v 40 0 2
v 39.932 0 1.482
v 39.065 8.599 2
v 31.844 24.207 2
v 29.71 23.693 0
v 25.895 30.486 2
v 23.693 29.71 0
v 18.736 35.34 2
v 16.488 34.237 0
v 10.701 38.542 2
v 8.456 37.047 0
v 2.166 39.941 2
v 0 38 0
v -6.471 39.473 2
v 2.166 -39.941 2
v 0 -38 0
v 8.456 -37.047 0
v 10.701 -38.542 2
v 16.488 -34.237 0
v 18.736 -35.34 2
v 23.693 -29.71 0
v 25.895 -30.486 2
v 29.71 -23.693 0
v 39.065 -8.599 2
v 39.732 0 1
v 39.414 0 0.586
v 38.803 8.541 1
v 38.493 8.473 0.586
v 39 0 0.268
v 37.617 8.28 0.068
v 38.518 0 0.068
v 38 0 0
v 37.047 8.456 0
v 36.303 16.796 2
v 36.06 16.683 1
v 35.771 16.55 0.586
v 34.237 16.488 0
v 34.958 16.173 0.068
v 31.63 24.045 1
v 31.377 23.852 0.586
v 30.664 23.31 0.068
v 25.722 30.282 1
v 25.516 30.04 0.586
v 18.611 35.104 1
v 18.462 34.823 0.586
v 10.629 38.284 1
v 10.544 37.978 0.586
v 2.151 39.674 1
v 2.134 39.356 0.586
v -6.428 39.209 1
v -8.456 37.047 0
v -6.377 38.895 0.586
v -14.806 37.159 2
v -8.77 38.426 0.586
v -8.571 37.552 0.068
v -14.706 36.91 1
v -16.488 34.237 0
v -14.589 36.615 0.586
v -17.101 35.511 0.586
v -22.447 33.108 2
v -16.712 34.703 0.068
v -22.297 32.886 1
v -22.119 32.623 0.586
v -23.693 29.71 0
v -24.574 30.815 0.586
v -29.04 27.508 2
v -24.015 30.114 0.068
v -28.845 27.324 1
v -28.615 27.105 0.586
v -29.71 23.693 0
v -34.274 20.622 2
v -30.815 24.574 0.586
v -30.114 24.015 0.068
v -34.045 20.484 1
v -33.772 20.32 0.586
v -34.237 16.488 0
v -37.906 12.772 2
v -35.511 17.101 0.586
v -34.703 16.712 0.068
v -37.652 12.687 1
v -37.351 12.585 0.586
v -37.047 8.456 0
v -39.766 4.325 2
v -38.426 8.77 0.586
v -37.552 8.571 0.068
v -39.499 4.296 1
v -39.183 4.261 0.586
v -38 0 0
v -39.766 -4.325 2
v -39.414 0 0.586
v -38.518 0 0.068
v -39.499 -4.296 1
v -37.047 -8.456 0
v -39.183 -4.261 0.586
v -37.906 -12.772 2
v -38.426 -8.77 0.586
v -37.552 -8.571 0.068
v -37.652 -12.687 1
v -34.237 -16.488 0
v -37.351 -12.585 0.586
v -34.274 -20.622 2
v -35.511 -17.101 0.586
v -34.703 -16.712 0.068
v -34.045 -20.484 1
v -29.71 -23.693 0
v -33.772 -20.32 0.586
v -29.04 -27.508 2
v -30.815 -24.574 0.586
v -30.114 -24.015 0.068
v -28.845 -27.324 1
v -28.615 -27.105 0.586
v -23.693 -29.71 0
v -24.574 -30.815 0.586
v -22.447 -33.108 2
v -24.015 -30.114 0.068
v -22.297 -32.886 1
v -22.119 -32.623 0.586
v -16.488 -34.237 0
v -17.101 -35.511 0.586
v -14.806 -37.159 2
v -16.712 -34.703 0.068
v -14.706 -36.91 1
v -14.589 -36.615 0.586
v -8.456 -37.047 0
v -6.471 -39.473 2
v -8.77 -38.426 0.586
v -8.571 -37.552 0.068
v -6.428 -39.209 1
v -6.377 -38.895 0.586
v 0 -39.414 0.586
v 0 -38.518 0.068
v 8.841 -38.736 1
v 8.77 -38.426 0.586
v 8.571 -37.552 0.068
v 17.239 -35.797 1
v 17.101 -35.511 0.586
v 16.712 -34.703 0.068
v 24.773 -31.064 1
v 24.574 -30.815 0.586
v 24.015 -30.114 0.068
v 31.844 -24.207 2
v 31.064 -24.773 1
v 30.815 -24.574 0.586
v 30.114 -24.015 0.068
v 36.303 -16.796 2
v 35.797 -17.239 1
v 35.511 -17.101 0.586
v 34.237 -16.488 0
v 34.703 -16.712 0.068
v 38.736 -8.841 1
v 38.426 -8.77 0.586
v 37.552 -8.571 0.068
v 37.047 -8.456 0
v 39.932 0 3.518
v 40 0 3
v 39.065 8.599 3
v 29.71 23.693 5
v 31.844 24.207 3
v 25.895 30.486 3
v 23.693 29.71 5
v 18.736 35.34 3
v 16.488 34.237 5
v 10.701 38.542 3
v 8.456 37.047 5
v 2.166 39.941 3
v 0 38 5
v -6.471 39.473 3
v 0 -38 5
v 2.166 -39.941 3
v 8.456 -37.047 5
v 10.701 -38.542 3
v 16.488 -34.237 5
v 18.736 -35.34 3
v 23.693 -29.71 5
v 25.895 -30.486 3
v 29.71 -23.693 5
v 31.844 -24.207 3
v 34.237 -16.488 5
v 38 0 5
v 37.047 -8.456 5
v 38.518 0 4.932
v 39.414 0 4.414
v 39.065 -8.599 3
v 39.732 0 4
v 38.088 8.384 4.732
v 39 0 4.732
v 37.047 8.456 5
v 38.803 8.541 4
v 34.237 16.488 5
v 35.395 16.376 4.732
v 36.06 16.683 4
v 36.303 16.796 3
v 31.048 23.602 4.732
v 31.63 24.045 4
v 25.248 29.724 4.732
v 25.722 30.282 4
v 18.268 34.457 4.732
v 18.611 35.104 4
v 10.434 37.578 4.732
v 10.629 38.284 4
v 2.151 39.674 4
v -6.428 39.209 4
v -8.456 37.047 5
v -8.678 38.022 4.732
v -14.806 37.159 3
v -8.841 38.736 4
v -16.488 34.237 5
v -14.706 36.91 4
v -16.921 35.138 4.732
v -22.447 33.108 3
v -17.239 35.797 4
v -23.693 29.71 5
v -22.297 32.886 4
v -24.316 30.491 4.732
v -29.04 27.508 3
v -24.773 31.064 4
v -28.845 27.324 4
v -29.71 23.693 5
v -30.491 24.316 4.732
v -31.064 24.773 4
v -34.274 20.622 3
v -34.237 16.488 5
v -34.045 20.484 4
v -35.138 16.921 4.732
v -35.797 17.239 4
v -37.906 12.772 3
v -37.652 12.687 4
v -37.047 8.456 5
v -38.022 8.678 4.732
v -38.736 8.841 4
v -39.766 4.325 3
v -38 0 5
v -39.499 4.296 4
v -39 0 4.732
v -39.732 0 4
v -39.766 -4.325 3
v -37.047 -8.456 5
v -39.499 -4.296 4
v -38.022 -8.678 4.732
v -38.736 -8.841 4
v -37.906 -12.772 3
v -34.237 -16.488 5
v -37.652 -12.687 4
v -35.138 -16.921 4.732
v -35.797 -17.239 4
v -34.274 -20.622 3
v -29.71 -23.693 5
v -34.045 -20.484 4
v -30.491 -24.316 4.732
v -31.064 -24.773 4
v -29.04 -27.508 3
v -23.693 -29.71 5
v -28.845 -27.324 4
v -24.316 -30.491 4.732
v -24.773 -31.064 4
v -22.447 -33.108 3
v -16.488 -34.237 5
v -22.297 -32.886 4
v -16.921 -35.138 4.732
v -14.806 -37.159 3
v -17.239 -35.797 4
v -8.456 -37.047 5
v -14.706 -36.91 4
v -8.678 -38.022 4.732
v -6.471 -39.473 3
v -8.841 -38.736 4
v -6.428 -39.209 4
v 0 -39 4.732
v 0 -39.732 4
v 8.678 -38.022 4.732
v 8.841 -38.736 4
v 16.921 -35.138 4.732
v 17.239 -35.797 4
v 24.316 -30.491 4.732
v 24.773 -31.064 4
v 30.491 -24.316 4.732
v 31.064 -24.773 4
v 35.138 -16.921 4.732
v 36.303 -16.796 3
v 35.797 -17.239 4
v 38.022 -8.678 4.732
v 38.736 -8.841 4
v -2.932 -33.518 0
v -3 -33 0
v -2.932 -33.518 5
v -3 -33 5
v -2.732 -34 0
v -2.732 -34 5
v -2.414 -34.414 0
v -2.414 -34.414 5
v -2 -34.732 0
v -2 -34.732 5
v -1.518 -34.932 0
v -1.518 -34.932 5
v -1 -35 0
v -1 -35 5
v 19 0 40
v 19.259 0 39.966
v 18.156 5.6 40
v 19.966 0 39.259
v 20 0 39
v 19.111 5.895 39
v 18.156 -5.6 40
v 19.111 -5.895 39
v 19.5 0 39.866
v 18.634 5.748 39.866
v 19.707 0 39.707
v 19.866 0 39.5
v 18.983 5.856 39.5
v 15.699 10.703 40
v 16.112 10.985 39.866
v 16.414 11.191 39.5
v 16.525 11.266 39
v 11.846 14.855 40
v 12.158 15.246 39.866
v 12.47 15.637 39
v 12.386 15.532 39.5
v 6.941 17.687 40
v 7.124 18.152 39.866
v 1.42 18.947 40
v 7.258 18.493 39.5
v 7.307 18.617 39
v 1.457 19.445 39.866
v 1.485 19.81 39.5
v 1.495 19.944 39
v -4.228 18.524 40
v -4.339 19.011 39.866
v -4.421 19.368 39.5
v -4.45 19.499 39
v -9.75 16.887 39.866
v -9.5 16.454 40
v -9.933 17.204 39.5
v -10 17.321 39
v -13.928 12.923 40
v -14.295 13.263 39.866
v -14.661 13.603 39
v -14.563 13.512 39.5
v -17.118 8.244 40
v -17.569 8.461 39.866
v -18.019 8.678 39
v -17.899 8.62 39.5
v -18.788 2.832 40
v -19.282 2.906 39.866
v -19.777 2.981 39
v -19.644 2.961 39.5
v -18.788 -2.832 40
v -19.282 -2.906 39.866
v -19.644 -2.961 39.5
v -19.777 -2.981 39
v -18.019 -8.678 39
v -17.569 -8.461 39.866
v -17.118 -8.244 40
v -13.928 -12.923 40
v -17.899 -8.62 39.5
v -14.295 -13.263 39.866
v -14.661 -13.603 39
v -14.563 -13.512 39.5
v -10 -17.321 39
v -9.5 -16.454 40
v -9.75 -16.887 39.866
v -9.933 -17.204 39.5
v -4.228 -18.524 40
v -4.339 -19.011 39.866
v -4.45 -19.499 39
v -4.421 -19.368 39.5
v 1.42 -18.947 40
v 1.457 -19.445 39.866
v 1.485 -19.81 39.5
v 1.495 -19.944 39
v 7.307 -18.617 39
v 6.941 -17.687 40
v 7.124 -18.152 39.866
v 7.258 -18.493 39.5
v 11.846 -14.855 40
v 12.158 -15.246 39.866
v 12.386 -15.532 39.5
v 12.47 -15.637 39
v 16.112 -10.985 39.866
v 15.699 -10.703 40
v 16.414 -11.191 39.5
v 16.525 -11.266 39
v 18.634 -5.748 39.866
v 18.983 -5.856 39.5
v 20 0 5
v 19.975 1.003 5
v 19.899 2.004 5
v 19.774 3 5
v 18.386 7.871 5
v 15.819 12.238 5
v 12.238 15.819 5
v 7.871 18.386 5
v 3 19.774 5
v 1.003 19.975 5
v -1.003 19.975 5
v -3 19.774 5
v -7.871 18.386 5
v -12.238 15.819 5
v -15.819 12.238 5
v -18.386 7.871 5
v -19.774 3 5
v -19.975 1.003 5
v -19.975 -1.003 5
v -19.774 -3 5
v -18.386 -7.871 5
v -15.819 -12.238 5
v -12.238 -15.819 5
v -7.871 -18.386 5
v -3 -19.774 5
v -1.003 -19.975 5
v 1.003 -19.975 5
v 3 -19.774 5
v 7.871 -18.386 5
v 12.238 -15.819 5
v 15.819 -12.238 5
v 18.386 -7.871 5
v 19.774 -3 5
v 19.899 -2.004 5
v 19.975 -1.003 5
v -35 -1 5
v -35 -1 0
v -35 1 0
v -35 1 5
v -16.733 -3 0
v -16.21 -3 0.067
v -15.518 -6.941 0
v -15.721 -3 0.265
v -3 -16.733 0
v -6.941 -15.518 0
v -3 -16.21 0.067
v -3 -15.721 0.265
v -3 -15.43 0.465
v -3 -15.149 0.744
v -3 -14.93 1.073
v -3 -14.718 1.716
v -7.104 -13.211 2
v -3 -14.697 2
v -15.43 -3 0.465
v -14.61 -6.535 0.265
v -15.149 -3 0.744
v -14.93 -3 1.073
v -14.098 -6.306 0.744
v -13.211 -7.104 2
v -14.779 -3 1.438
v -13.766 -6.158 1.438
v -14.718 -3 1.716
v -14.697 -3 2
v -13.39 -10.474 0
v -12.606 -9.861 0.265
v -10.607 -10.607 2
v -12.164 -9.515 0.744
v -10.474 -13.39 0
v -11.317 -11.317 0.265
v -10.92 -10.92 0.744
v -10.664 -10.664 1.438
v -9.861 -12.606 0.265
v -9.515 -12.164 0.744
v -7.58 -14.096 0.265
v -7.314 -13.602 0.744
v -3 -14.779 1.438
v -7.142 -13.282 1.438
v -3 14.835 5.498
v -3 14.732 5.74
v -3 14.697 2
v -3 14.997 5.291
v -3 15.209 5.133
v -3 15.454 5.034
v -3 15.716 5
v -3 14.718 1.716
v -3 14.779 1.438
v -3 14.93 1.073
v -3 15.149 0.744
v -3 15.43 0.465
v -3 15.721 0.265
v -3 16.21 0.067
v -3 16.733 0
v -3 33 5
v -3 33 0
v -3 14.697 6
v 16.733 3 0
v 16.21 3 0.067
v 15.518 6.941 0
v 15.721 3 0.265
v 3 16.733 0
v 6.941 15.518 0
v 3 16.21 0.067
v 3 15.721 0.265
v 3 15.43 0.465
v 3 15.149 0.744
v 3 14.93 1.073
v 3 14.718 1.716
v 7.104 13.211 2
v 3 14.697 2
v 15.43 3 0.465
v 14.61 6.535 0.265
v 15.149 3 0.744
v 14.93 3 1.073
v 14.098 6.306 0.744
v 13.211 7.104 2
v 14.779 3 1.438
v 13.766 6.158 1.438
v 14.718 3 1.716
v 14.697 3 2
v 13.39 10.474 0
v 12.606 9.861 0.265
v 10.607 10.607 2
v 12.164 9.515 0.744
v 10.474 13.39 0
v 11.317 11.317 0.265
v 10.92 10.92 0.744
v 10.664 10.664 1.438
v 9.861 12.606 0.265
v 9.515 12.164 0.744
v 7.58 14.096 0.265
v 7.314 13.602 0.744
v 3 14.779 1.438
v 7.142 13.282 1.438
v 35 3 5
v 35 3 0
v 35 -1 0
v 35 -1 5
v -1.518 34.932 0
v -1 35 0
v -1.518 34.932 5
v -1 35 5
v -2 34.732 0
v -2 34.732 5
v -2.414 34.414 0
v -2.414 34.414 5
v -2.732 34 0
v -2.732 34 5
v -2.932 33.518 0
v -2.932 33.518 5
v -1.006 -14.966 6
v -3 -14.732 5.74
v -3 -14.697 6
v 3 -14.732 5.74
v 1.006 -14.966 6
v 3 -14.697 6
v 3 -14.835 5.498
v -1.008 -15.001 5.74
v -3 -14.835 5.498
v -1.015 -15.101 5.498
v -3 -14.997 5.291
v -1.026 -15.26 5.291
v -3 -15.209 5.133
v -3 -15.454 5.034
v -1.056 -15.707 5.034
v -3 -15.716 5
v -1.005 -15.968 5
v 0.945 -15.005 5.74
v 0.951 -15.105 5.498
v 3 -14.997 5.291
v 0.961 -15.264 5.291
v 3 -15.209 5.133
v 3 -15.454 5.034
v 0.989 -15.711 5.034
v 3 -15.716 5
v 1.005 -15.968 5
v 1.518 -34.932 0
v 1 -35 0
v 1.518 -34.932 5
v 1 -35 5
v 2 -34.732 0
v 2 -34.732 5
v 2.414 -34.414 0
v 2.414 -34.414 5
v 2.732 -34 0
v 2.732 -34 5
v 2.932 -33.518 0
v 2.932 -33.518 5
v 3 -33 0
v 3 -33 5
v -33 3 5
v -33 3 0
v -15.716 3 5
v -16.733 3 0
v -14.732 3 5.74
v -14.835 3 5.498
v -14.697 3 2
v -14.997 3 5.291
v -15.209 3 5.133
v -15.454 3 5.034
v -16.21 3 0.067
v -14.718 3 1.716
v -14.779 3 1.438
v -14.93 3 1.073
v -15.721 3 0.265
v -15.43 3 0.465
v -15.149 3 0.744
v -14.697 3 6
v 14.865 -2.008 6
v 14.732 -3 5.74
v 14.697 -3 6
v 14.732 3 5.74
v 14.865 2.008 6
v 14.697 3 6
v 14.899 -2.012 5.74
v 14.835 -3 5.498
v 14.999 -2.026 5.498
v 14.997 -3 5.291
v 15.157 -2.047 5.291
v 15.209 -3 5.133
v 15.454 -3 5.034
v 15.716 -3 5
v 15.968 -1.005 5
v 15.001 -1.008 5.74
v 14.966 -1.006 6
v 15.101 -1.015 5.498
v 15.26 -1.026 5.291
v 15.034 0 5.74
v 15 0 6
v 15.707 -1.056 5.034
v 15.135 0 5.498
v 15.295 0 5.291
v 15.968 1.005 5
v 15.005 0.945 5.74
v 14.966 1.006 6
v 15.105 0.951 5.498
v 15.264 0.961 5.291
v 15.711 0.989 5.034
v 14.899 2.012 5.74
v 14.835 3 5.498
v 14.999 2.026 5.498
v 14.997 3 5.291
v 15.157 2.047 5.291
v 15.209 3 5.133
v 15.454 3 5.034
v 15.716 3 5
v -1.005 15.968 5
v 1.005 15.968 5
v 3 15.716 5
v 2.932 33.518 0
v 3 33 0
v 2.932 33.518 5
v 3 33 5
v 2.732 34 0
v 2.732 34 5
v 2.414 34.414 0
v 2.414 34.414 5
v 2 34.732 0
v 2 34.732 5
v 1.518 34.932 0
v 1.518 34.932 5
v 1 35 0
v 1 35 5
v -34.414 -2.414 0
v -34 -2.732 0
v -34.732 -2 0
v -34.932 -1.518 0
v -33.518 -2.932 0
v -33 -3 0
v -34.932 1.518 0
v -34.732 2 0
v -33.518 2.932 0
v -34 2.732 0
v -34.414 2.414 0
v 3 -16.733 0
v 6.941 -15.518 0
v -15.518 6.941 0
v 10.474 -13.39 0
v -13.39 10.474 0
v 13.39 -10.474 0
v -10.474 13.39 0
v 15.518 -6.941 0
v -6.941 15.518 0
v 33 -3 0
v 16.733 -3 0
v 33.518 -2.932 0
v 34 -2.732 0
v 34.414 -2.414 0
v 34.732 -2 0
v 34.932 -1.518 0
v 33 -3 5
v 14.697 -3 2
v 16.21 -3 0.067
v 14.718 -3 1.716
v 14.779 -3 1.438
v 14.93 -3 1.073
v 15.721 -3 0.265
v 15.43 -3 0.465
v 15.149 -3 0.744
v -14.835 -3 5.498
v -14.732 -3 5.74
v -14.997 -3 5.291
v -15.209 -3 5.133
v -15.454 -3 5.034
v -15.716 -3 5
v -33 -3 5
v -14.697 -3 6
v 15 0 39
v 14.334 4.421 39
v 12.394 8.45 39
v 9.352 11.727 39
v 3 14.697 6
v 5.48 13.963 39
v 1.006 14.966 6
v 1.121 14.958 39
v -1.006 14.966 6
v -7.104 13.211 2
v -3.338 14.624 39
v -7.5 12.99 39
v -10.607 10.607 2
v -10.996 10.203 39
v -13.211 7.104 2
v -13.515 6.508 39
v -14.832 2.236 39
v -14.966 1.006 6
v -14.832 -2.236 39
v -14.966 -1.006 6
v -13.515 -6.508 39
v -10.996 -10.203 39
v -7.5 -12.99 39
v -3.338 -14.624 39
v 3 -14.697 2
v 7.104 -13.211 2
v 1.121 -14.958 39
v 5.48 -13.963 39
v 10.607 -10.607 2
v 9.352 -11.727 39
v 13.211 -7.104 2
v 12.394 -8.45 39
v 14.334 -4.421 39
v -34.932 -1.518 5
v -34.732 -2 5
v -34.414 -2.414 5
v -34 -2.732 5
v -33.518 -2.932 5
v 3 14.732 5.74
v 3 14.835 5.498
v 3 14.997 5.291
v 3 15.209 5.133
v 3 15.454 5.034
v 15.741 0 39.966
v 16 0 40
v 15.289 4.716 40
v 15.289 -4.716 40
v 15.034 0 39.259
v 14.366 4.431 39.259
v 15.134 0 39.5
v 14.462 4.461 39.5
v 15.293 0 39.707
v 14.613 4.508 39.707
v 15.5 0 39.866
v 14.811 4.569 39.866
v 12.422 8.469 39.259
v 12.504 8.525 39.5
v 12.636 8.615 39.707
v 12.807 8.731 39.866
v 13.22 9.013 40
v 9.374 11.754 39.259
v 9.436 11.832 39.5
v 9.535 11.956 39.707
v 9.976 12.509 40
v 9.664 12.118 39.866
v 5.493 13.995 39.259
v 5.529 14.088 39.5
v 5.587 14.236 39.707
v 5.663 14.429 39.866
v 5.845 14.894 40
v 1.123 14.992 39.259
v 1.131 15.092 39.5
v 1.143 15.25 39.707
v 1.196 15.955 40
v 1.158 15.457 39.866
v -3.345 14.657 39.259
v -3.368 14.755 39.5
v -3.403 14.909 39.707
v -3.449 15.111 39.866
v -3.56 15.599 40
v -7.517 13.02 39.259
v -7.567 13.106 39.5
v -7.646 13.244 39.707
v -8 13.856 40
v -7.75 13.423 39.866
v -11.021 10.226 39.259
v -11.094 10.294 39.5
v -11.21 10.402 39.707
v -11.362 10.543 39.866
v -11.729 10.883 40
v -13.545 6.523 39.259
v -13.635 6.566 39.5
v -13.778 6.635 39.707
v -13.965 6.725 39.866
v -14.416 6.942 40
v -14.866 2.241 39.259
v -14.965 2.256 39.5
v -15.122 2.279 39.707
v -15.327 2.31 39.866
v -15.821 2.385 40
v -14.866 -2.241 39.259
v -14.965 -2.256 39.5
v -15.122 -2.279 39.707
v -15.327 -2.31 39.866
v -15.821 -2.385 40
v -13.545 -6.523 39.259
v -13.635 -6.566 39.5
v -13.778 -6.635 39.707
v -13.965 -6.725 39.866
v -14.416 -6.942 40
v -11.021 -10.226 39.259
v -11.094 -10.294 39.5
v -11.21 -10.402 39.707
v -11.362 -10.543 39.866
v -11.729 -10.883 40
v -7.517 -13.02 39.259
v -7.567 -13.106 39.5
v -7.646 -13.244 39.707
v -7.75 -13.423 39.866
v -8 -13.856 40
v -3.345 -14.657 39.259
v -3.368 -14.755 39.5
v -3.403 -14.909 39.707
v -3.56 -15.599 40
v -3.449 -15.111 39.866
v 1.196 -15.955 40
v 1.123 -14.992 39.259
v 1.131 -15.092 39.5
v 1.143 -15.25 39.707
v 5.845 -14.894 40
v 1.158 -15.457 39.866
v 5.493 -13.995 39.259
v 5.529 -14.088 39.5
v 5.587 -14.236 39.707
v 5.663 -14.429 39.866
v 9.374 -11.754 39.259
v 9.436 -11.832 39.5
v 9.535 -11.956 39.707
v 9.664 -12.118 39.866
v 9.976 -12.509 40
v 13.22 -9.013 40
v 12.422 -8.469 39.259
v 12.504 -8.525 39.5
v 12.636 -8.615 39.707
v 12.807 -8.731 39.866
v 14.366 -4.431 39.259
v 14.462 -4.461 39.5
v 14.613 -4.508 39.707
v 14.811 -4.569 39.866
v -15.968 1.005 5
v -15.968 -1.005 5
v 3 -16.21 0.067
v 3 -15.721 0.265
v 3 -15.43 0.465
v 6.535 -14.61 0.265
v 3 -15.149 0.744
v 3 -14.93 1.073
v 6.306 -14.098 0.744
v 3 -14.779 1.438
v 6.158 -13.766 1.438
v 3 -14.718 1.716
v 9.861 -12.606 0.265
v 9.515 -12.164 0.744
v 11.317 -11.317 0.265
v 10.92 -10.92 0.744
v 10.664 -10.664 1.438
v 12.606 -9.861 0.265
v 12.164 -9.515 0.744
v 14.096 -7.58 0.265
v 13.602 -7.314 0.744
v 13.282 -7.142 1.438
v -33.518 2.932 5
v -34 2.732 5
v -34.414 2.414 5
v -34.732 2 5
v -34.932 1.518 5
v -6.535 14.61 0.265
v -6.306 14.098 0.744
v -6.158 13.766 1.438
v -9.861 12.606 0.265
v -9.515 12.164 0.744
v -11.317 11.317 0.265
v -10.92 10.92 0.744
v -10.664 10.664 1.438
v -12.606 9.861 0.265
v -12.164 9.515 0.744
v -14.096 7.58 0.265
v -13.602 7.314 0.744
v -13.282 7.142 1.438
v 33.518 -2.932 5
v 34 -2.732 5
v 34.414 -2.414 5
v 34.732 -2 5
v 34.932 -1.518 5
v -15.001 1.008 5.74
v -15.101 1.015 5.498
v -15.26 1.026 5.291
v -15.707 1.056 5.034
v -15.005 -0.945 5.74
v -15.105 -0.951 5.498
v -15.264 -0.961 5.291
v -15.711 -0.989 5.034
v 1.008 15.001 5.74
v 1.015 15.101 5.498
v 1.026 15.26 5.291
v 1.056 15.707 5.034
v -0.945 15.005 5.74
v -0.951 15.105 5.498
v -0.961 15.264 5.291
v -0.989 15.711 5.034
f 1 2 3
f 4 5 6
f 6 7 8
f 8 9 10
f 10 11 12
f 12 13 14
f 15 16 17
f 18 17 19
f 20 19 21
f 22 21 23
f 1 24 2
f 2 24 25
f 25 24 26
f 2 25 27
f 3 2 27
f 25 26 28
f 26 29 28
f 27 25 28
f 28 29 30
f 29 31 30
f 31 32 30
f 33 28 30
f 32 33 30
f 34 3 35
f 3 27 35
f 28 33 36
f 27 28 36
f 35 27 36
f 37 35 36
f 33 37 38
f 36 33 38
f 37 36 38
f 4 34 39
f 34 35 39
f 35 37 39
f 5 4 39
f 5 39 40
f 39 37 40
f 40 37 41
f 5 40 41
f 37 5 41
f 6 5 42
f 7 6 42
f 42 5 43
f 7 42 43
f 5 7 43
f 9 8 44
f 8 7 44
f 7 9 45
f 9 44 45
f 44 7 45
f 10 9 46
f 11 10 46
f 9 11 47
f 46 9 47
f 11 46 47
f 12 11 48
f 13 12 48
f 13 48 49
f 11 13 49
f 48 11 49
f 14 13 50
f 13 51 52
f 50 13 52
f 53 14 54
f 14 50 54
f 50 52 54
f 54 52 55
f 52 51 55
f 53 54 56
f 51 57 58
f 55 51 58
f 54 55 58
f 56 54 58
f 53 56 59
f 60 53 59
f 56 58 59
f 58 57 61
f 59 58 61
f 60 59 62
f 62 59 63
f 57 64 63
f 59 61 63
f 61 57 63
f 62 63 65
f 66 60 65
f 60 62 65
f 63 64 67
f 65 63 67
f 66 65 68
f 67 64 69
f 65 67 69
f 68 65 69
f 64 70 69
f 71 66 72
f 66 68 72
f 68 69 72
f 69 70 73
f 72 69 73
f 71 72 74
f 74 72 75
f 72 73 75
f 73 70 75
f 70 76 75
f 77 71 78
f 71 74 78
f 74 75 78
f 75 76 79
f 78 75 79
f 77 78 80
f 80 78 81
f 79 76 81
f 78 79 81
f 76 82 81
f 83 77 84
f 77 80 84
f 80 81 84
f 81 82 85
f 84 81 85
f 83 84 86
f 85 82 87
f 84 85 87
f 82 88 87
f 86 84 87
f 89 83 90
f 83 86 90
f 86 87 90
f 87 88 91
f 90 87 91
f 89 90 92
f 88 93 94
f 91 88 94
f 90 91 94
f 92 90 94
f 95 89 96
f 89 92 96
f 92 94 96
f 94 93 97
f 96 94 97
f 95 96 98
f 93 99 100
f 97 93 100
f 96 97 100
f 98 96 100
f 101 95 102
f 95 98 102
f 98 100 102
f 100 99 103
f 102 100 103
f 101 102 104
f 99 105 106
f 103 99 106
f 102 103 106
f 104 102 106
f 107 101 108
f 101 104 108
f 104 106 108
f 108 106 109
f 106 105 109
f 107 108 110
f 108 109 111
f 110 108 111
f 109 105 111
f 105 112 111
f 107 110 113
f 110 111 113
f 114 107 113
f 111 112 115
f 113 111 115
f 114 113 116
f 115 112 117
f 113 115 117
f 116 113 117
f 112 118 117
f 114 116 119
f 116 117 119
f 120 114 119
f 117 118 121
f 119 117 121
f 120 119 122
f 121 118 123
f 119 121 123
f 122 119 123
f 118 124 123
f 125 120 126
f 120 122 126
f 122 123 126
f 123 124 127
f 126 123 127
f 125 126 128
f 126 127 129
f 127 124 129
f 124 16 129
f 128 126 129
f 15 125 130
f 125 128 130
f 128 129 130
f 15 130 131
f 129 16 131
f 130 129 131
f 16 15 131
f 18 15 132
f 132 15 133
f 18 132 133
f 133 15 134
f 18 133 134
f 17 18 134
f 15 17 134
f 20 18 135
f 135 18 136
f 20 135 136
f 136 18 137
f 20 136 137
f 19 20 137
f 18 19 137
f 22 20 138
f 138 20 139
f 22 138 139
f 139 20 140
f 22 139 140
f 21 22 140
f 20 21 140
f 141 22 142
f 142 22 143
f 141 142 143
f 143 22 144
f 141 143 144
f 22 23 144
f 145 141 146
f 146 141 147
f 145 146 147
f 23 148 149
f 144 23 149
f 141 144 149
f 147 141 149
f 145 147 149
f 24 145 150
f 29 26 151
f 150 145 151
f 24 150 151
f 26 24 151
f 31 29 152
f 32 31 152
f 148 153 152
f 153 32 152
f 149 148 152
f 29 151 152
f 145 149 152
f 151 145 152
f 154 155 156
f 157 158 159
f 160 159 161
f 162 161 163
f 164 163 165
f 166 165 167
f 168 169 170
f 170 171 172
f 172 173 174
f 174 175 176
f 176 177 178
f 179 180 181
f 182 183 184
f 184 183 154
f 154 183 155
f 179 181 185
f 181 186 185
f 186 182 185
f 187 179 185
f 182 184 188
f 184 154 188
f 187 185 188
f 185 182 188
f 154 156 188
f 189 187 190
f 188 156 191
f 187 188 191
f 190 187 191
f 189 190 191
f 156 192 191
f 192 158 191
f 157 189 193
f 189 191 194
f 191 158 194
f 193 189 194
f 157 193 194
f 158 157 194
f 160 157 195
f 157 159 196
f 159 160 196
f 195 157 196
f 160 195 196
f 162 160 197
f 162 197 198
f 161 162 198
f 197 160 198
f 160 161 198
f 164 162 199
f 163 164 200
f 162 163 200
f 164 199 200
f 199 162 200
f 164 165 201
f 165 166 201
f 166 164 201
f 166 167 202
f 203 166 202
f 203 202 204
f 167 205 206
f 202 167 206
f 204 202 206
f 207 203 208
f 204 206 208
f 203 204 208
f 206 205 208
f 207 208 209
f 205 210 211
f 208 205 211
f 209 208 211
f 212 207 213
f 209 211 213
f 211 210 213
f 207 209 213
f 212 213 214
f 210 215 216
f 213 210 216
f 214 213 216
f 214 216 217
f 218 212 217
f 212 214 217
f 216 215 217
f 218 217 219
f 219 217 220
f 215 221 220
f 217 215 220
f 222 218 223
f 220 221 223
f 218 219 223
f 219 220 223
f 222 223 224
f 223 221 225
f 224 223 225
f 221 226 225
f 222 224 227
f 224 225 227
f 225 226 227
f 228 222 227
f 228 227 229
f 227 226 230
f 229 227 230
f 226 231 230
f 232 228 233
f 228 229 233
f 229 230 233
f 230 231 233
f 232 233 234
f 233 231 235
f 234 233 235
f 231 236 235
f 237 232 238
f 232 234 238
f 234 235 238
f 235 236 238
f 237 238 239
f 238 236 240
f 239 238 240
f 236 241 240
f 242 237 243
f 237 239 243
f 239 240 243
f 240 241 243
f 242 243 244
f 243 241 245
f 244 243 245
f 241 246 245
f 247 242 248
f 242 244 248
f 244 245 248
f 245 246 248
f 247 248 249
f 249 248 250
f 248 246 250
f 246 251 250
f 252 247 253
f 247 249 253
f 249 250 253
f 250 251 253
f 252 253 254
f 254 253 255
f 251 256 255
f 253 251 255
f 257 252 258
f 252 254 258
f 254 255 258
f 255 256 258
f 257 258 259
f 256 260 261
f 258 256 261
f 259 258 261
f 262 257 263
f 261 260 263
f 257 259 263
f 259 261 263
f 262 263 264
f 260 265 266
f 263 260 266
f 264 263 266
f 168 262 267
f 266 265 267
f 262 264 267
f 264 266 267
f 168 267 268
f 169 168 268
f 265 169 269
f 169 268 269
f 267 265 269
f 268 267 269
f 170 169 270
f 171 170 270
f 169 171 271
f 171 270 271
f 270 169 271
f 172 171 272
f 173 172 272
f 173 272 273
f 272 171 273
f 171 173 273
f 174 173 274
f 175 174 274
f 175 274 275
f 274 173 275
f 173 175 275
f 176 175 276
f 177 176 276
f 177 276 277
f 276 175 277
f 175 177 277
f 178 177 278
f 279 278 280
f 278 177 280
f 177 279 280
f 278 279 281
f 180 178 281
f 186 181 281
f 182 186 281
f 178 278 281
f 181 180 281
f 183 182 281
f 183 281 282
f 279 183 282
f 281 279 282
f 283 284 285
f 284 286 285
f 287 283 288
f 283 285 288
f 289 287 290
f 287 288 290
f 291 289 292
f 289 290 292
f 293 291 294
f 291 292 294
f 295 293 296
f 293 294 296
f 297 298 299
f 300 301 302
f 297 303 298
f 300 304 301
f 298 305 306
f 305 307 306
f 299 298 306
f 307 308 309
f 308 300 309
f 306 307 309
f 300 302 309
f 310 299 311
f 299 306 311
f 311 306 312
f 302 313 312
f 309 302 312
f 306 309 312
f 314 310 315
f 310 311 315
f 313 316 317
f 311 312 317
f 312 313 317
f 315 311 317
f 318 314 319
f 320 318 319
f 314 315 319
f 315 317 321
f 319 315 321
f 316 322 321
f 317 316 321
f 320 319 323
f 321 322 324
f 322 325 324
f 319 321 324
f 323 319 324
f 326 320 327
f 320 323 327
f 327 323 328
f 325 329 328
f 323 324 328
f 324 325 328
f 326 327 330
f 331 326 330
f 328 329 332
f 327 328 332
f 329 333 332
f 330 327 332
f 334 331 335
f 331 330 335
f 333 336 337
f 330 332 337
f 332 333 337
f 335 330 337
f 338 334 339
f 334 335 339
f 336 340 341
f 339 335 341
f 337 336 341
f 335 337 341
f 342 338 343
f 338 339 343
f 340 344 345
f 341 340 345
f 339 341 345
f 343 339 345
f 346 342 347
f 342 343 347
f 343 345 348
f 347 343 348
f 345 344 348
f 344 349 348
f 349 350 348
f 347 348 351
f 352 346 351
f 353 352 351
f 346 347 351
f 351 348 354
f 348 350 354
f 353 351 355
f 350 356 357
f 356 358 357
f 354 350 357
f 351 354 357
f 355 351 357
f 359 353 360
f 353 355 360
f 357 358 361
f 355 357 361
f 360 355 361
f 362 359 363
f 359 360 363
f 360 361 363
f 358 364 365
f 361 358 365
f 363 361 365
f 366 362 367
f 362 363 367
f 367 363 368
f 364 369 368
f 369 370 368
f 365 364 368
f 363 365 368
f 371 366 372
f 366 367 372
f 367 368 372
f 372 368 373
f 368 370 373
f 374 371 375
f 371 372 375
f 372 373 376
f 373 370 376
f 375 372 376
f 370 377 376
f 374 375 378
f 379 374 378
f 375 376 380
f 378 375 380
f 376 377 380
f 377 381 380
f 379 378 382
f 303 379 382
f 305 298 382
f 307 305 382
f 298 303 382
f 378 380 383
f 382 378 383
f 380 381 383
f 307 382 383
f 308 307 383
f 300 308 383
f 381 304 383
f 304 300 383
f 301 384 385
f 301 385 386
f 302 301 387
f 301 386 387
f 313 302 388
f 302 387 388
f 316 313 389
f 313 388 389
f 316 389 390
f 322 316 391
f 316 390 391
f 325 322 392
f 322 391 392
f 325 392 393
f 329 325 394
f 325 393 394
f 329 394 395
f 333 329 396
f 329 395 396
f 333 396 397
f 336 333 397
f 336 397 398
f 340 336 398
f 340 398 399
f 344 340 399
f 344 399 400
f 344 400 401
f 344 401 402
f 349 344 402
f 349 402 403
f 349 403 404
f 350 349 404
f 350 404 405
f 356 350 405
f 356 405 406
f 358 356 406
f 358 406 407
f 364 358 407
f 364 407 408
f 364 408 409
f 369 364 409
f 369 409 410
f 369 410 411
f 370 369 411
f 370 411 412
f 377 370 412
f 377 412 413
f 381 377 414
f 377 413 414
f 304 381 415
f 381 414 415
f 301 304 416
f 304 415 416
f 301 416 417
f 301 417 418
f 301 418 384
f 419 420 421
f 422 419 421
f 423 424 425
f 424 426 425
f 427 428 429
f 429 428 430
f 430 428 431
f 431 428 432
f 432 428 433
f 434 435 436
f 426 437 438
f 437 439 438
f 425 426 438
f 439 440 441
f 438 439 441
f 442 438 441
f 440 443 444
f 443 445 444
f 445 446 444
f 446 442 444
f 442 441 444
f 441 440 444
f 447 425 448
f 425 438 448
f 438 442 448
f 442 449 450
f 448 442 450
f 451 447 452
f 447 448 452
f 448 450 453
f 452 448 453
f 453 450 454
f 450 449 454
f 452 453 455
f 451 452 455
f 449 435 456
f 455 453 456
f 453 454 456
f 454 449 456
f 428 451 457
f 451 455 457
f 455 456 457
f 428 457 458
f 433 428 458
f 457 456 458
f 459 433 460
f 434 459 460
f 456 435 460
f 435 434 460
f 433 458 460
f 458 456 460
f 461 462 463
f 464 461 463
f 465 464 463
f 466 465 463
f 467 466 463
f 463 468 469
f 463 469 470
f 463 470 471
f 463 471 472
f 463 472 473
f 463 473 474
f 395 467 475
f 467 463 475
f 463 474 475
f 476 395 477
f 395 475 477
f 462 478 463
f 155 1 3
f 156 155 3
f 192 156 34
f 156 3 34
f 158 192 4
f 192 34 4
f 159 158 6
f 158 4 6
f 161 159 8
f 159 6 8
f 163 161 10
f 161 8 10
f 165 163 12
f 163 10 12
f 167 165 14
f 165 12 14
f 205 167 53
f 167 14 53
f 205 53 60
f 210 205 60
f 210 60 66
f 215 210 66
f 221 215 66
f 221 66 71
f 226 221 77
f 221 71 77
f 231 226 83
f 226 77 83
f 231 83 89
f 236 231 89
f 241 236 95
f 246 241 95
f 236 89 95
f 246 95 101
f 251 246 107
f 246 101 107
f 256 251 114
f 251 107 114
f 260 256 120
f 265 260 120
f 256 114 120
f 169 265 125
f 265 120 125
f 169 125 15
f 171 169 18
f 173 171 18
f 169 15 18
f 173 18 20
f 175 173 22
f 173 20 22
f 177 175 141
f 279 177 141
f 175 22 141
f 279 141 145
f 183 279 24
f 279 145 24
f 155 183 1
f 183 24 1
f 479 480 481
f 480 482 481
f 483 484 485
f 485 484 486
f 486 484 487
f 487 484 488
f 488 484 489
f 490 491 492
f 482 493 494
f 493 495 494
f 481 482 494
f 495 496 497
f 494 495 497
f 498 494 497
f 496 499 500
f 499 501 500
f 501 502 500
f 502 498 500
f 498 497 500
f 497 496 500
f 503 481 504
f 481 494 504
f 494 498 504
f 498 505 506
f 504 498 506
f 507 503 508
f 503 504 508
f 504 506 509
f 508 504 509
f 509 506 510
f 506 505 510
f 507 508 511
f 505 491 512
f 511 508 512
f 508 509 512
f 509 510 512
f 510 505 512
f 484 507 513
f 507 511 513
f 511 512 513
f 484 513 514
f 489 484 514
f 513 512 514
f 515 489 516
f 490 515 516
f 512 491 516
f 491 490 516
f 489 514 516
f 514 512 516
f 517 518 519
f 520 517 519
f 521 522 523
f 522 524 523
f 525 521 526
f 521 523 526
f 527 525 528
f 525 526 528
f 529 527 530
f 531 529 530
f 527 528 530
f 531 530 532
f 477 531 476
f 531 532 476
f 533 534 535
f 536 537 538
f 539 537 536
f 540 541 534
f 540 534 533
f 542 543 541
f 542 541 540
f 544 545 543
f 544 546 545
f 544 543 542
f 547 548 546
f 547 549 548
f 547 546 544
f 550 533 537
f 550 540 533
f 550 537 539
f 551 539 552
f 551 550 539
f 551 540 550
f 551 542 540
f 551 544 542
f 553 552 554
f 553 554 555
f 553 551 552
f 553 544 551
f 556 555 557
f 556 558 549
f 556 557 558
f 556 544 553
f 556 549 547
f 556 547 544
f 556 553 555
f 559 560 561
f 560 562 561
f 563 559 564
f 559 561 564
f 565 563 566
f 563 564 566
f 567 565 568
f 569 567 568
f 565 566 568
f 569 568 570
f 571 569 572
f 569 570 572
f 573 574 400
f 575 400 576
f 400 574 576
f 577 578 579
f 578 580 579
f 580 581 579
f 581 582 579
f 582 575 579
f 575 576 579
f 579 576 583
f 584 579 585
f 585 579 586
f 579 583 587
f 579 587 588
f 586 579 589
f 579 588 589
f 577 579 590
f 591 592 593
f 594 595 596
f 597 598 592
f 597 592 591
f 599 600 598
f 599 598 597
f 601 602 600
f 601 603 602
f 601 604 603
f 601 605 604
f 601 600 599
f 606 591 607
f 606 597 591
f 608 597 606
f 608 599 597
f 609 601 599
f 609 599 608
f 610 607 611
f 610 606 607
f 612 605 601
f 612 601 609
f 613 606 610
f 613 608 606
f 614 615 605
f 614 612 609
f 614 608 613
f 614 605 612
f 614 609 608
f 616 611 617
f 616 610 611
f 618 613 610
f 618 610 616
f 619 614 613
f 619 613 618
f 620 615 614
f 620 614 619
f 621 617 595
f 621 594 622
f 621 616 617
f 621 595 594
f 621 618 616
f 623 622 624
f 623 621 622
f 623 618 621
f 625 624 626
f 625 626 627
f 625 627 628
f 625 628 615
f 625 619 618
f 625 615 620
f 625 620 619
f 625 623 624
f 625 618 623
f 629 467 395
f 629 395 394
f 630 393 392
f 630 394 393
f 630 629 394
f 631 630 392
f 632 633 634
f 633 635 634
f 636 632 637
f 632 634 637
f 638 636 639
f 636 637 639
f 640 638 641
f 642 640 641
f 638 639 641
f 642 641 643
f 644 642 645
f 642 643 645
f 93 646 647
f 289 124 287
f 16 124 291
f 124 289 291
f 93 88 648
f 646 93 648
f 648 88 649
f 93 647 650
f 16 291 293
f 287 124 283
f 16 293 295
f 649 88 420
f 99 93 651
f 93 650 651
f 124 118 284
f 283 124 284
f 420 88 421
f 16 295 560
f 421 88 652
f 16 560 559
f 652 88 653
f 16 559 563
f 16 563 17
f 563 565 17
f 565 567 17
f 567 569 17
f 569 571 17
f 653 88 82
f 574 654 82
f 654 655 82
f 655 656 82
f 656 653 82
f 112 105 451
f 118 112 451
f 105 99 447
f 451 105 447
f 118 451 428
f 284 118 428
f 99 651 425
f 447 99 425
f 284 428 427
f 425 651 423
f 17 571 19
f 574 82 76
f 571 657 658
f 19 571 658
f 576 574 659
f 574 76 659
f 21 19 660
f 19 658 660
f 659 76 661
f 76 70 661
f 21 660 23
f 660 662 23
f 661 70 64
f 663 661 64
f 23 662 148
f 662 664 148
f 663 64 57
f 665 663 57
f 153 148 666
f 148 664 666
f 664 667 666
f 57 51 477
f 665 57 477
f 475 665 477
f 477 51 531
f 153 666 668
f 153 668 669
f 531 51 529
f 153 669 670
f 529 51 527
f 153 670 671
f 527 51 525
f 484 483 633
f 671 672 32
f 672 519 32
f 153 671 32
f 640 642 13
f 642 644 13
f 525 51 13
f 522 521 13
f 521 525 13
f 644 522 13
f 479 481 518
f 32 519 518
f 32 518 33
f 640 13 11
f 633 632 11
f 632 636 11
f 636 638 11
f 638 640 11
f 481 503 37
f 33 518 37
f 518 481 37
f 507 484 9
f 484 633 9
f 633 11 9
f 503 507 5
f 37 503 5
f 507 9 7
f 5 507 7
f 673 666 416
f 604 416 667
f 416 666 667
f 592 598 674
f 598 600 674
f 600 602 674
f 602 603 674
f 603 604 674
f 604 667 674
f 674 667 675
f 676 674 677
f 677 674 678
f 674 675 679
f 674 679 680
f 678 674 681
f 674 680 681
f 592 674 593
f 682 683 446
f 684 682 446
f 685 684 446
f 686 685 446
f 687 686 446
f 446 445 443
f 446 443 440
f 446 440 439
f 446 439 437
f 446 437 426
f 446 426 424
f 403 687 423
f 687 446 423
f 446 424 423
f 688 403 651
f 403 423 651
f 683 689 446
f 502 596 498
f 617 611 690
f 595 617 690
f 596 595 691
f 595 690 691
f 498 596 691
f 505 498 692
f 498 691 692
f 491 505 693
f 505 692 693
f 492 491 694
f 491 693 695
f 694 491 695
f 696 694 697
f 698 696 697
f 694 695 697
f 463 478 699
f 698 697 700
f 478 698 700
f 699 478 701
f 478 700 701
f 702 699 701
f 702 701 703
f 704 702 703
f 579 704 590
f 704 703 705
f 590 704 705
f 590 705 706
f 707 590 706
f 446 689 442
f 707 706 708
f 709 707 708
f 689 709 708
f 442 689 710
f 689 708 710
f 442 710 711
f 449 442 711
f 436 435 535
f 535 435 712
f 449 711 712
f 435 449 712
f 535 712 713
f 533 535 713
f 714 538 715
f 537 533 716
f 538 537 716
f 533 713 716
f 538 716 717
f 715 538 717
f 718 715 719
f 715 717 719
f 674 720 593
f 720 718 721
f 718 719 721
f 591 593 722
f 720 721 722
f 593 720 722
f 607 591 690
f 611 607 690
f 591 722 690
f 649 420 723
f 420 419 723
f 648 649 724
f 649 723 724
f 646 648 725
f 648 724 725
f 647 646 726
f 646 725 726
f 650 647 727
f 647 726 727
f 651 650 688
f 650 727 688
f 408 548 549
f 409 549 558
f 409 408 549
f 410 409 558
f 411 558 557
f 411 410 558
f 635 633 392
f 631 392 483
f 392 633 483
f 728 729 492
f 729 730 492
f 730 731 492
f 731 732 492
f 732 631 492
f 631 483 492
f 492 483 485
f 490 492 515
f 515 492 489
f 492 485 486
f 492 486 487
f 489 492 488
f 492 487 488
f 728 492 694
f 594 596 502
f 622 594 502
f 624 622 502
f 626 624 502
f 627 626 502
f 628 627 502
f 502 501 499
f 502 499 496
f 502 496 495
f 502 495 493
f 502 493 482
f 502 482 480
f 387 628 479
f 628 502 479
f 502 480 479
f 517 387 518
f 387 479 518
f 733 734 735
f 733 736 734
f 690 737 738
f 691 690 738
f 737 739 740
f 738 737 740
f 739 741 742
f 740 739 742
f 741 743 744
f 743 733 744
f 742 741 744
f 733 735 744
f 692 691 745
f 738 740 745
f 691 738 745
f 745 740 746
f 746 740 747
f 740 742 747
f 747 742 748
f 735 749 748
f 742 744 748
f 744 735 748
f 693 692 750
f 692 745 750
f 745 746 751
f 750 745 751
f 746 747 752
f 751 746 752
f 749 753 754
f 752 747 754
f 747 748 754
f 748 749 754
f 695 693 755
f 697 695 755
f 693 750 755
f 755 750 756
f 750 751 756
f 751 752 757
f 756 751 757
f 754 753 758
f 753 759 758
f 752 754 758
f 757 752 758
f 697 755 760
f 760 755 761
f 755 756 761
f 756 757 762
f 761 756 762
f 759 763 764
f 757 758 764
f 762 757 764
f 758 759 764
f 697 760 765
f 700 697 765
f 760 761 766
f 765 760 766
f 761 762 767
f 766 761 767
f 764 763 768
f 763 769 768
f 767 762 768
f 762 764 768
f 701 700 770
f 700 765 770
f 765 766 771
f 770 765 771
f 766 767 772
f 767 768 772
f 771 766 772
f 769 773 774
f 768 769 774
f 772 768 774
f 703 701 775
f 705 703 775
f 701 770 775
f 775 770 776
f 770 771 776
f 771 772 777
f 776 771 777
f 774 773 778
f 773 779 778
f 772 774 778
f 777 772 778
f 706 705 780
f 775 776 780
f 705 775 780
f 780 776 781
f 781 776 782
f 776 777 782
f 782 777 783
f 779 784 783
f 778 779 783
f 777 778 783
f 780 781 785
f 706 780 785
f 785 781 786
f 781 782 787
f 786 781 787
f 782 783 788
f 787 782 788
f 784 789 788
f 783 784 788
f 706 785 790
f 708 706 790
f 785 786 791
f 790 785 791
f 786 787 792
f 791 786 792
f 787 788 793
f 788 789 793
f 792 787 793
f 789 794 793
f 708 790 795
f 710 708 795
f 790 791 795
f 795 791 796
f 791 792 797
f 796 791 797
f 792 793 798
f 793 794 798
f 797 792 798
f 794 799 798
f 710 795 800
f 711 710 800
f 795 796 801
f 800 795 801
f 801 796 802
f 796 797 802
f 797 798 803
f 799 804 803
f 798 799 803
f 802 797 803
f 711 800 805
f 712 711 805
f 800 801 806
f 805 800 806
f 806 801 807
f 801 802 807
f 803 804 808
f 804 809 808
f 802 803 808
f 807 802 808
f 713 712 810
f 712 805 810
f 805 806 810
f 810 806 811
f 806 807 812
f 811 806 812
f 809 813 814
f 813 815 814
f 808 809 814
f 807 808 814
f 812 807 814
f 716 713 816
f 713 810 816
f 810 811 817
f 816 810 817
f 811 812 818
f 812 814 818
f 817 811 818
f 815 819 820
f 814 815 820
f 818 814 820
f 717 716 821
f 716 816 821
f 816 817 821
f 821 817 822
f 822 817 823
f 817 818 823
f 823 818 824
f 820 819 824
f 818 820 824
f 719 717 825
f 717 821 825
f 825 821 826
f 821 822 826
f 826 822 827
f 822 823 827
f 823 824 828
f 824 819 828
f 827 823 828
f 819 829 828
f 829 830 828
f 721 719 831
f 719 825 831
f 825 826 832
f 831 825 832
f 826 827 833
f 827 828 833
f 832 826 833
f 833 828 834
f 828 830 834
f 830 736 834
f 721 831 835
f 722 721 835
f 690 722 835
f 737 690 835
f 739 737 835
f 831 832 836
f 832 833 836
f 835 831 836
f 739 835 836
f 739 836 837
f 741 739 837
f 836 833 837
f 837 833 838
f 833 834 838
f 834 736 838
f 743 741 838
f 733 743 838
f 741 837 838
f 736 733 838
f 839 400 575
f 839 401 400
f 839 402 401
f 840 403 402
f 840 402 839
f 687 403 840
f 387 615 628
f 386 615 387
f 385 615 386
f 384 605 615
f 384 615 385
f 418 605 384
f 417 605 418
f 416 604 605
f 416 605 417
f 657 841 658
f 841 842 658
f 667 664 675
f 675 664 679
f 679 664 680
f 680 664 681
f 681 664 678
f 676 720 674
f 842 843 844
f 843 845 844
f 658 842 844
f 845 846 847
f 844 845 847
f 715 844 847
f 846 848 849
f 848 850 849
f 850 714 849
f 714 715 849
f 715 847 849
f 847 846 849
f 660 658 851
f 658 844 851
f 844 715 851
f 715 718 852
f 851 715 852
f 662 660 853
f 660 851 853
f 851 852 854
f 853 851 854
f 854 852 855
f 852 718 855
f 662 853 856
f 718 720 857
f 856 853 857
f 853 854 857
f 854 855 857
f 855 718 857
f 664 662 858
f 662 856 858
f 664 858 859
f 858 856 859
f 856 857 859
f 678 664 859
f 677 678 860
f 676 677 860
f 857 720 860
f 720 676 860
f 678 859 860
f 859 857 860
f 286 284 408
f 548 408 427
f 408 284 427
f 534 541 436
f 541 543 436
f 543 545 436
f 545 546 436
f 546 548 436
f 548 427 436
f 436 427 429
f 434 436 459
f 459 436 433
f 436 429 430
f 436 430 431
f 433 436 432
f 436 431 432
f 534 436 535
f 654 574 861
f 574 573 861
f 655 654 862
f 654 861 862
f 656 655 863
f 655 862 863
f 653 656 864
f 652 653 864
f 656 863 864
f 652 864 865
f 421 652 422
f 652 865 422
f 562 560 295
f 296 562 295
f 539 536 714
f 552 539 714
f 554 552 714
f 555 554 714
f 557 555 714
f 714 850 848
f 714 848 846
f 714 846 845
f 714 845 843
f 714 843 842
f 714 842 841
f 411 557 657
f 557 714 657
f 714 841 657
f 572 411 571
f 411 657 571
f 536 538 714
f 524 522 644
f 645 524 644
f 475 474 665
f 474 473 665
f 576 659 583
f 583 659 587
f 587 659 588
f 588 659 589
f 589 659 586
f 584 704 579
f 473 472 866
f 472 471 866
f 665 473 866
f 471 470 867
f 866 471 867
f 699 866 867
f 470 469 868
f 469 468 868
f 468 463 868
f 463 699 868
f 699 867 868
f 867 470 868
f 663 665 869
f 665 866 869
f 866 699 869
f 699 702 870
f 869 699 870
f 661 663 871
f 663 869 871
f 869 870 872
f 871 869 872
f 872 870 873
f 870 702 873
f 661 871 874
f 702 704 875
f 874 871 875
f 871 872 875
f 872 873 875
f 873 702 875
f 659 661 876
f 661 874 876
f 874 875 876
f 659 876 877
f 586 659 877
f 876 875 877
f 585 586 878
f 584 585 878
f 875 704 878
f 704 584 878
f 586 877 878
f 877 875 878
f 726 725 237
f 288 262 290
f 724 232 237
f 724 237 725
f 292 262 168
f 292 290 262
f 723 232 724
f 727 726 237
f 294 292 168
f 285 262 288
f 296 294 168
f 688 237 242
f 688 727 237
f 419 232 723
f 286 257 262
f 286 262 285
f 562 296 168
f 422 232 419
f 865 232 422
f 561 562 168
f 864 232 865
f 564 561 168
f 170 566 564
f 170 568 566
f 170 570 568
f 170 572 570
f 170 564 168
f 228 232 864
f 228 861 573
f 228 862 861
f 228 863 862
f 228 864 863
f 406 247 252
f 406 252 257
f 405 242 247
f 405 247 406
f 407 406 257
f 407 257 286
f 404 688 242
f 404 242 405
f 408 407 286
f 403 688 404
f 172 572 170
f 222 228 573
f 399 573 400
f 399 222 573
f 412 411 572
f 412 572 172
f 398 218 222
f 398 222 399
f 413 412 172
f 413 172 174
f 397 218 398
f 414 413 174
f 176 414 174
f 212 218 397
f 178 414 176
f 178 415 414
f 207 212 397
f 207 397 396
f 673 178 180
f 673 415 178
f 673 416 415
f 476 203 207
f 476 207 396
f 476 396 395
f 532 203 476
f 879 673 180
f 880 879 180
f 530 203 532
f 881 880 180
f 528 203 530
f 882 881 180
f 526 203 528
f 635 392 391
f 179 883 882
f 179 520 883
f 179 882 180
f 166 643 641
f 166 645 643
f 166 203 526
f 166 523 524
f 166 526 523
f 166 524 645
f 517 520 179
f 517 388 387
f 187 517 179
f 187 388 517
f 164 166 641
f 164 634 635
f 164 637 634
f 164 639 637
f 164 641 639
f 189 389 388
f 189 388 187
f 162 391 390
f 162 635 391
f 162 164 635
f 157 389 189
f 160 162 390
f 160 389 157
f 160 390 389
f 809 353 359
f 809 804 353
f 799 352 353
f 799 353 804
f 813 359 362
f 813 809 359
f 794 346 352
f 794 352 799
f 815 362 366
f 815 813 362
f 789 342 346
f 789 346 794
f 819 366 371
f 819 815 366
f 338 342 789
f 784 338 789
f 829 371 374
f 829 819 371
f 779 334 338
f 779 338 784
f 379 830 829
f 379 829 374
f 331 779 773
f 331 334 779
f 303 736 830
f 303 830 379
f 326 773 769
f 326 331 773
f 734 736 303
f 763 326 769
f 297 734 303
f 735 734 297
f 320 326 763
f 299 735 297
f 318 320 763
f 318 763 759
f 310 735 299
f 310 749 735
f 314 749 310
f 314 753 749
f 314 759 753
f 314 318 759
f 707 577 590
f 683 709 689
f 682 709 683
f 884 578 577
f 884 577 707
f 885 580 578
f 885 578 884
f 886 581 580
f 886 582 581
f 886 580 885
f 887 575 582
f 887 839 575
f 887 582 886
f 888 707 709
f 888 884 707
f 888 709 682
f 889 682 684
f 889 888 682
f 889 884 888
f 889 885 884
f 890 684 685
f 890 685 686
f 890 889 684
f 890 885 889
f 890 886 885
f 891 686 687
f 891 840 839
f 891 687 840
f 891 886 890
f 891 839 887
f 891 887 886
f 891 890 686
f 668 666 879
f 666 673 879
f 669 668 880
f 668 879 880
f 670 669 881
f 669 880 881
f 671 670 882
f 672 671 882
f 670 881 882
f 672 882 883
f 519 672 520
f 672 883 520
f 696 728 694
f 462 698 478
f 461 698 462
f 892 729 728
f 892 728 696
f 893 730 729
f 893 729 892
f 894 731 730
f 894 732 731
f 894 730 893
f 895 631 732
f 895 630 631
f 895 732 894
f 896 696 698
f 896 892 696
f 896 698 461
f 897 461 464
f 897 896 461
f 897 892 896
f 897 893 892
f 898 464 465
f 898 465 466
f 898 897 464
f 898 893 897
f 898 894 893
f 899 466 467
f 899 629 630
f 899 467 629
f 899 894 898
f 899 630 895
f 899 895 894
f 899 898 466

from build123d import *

# Parameters (mm, degrees)
SKETCH_R        = 40
PAD_DEPTH       = 5
SKETCH001_R     = 20
PAD001_DEPTH    = 35
SKETCH002_R     = 15
POCKET_DEPTH    = 40.001
POCKET001_DEPTH = 5
FILLET_R        = 2
FILLET001_R     = 2
FILLET002_R     = 1
FILLET003_R     = 2


with BuildPart() as part:
    # Sketch → Pad (new body)
    with BuildSketch(Plane.XY):
        Circle(SKETCH_R)
    extrude(amount=PAD_DEPTH)

    # Sketch001 (on Face3 of Pad) → Pad001 (join)
    with BuildSketch(Plane.XY.offset(5)):
        Circle(SKETCH001_R)
    extrude(amount=PAD001_DEPTH)

    # Sketch002 (on Face5 of Pad001) → Pocket (cut, through all)
    with BuildSketch(Plane.XY.offset(40)):
        Circle(SKETCH002_R)
    extrude(amount=-POCKET_DEPTH, mode=Mode.SUBTRACT)

    # Sketch003 (on Face2 of Pocket) → Pocket001 (cut)
    with BuildSketch(Plane(origin=(0, 0, 0), x_dir=(1, 0, 0), z_dir=(0, 0, -1))):
        Polygon((-3, 35), (-3, 3), (-35, 3), (-35, -3), (-3, -3), (-3, -35), (3, -35), (3, -3), (35, -3), (35, 3), (3, 3), (3, 35), align=None)
    extrude(amount=-POCKET001_DEPTH, mode=Mode.SUBTRACT)

    # Fillet
    fillet_edges = [part.edges().sort_by_distance(p)[0] for p in [
        (-3, -35, 2.5),
        (3, -35, 2.5),
        (35, -3, 2.5),
        (-35, -3, 2.5),
        (-35, 3, 2.5),
        (-3, 35, 2.5),
        (3, 35, 2.5),
    ]]
    fillet(fillet_edges, radius=FILLET_R)

    # Fillet001
    fillet001_edges = [part.edges().sort_by_distance(p)[0] for p in [
        (10.606602, -10.606602, 0),
        (10.606602, 10.606602, 0),
        (-10.606602, 10.606602, 0),
        (-10.606602, -10.606602, 0),
    ]]
    fillet(fillet001_edges, radius=FILLET001_R)

    # Fillet002
    fillet002_edges = [part.edges().sort_by_distance(p)[0] for p in [
        (-20, 0, 40),
        (-15, 0, 40),
        (0, -15, 5),
        (14.924042, -1.507634, 5),
        (0, 15, 5),
        (-15, 0, 5),
    ]]
    fillet(fillet002_edges, radius=FILLET002_R)

    # Fillet003
    fillet003_edges = [part.edges().sort_by_distance(p)[0] for p in [
        (-40, 0, 5),
        (-40, 0, 0),
    ]]
    fillet(fillet003_edges, radius=FILLET003_R)


solid = part.part
